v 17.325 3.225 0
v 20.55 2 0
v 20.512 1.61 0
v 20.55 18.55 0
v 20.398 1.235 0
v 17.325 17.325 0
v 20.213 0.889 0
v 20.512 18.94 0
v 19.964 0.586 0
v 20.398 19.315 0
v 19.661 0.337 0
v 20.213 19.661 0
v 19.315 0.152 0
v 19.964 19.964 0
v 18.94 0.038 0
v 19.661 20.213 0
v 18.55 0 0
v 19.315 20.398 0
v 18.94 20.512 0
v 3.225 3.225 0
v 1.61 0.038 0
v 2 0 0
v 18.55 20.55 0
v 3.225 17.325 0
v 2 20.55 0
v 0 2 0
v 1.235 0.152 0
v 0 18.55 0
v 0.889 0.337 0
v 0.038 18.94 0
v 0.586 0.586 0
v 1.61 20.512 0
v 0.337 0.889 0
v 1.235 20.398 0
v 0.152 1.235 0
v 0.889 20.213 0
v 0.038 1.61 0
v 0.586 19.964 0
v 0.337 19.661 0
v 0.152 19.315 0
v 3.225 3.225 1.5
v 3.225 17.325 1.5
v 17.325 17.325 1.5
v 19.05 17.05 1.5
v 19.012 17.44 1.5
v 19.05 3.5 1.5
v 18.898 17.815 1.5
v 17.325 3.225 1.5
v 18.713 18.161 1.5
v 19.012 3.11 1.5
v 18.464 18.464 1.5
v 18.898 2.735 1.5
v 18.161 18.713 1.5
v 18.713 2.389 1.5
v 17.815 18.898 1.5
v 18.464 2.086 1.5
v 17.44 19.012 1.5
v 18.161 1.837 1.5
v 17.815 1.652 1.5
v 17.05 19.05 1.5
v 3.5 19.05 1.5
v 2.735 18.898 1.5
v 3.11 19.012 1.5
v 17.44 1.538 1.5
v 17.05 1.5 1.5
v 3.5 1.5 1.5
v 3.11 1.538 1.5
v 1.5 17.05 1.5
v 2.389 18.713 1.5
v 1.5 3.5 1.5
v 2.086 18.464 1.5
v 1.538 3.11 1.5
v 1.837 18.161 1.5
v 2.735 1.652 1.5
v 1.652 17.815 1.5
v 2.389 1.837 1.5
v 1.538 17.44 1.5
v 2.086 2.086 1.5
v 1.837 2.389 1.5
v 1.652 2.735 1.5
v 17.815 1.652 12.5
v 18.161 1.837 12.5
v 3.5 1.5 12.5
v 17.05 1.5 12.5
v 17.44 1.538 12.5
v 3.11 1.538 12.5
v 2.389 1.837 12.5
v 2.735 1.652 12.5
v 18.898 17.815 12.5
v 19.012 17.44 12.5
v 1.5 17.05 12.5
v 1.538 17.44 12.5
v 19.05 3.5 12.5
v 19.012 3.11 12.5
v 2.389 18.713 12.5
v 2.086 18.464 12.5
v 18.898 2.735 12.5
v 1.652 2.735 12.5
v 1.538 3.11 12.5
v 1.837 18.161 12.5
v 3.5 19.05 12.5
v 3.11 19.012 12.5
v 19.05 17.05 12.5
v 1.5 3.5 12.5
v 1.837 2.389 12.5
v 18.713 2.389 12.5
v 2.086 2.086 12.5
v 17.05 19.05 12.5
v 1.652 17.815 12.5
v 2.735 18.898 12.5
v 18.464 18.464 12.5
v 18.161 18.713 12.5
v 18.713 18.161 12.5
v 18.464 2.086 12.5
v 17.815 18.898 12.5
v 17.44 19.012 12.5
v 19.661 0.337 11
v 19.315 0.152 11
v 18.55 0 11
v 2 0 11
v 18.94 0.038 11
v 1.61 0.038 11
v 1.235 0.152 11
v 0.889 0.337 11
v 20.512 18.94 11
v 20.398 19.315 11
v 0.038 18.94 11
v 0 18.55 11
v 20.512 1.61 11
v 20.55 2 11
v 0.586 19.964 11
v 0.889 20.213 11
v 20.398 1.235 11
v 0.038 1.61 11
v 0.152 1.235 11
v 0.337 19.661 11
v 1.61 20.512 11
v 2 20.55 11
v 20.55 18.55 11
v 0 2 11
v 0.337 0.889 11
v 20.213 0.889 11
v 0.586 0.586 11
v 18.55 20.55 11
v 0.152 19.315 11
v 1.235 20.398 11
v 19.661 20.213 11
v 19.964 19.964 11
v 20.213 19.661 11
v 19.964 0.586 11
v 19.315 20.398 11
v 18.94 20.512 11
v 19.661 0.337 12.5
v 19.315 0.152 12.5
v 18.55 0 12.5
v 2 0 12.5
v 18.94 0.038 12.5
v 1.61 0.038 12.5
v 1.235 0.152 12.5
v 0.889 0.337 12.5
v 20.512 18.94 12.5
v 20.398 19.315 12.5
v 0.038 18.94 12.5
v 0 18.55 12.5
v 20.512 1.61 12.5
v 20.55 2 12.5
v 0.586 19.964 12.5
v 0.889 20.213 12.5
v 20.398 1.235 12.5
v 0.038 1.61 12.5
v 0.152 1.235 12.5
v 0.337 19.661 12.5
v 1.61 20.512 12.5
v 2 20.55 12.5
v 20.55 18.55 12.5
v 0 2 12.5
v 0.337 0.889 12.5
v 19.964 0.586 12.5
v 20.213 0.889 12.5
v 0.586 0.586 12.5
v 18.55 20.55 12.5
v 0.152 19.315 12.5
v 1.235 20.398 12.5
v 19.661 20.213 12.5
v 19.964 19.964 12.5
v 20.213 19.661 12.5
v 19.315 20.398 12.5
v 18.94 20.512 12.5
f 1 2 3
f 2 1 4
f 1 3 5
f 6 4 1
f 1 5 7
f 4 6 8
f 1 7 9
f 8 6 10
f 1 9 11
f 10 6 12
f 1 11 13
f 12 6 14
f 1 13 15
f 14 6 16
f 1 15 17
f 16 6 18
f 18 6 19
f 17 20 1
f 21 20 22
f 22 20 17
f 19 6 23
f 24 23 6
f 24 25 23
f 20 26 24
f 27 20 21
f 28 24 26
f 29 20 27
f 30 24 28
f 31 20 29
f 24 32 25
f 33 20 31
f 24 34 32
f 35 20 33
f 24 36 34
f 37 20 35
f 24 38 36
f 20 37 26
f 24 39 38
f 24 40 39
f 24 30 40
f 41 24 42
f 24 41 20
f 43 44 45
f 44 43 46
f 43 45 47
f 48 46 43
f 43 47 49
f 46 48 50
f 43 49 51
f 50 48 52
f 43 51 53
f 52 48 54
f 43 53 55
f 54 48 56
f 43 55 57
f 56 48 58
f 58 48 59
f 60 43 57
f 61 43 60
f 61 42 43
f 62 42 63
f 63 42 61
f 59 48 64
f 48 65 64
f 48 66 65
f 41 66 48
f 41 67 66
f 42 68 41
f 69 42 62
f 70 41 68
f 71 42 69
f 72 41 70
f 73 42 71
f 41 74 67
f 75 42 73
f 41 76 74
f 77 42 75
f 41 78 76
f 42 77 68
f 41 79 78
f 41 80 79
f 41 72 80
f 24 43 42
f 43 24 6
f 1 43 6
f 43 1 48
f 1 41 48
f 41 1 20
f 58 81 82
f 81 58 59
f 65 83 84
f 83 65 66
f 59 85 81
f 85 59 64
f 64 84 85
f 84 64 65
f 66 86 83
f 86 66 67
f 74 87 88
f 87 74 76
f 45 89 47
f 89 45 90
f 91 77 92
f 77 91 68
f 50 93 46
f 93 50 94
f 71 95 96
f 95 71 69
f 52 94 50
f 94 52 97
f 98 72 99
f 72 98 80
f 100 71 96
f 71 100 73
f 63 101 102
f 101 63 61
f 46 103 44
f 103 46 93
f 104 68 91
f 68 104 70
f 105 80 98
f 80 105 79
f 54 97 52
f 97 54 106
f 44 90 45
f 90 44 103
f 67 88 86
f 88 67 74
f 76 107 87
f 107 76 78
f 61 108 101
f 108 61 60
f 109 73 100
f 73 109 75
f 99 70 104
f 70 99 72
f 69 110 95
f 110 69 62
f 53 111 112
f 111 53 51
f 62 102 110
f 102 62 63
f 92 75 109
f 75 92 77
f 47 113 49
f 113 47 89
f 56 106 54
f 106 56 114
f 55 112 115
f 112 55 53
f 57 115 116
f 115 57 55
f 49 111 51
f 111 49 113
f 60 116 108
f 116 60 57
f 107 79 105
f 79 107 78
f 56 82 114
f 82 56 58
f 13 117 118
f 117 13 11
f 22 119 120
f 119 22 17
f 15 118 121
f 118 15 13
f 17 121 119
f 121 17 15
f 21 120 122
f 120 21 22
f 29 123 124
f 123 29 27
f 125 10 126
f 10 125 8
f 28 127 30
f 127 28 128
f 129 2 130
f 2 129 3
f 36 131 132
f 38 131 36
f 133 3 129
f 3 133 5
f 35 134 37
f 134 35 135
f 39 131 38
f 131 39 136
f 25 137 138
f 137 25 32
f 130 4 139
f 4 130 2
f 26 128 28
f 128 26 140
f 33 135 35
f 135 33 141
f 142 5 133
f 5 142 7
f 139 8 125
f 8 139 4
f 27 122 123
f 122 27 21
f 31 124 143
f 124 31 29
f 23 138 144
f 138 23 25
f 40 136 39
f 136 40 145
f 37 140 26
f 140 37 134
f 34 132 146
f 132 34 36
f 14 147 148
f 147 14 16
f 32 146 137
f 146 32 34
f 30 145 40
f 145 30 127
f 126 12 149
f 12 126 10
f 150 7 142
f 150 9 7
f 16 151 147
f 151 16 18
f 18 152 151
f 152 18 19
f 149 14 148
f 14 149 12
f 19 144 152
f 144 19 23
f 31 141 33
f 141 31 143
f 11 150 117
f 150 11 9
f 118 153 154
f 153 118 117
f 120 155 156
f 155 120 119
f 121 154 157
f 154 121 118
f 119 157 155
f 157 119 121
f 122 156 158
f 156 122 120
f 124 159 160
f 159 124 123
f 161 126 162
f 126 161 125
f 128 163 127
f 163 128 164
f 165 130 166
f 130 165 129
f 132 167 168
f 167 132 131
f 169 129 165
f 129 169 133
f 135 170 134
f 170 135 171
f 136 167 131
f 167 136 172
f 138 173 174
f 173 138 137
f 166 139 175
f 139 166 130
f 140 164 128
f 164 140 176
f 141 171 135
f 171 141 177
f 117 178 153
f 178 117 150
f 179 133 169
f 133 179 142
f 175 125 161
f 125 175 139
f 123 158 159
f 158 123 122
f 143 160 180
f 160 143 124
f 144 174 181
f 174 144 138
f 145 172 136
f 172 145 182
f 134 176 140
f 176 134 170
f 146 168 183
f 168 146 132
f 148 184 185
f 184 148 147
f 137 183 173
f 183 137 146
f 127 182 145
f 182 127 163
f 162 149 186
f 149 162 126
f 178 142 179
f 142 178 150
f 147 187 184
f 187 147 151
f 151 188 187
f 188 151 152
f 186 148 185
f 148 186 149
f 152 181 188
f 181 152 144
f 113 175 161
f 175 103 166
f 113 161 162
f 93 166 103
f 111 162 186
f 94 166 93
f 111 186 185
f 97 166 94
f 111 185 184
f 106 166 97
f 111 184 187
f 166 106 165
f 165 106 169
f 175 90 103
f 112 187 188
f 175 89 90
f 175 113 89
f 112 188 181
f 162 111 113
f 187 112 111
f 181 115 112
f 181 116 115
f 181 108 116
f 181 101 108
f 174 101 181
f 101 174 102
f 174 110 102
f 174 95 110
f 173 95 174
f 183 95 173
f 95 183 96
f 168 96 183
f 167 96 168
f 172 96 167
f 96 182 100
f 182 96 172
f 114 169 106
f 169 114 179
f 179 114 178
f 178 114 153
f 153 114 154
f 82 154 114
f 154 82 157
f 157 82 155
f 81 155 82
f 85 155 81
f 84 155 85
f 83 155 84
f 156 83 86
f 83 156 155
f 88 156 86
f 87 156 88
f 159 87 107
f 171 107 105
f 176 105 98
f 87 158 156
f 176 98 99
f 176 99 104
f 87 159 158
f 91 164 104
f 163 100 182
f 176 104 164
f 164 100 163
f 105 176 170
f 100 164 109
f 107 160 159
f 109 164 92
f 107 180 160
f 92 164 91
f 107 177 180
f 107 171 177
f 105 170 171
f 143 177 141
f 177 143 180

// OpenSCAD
ROWS = 1;
COLUMNS = 1;
SWITCH_HEIGHT = 11;
SKIRT_HEIGHT = 1.5;
TOLERANCE = 0.1;
PLATE_THICKNESS = 1.5;      // Official spec for Cherry MX is 1.5 ± 0.1 mm
BOTTOM_PLATE_THICKNESS = 1; // Official spec for Cherry MX is 1.5 ± 0.1 mm
WALL_THICKNESS = 1.5;
CORNER_RADIUS = 2;

// See https://matt3o.com/anatomy-of-a-keyboard/
SWITCH_HOLE_SIZE = 14;
SWITCH_DISTANCE_BETWEEN_HOLES = 5.05;

$fn = 32;

module body_main(ROWS = ROWS, COLUMNS = COLUMNS, SWITCH_HEIGHT = SWITCH_HEIGHT, SKIRT_HEIGHT = SKIRT_HEIGHT,
                 TOLERANCE = TOLERANCE, PLATE_THICKNESS = PLATE_THICKNESS,
                 BOTTOM_PLATE_THICKNESS = BOTTOM_PLATE_THICKNESS, WALL_THICKNESS = WALL_THICKNESS,
                 CORNER_RADIUS = CORNER_RADIUS)
{
    keycap_placeholder_space = SWITCH_HOLE_SIZE + SWITCH_DISTANCE_BETWEEN_HOLES;
    x_size = keycap_placeholder_space * COLUMNS + WALL_THICKNESS;
    y_size = keycap_placeholder_space * ROWS + WALL_THICKNESS;
    x_size_corrected = x_size - CORNER_RADIUS * 2;
    y_size_corrected = y_size - CORNER_RADIUS * 2;
    x_inner_size_corrected = x_size_corrected - WALL_THICKNESS * 2;
    y_inner_size_corrected = y_size_corrected - WALL_THICKNESS * 2;

    module hole()
    {
        translate([ keycap_placeholder_space / 2, keycap_placeholder_space / 2, 0 ])
        {
            // Keycap Mock
            // translate([ 0, 0, 8 ]) color("red") linear_extrude(height = 8) square(keycap_placeholder_space, center =
            // true);

            // Plate hole
            color("blue") linear_extrude(height = PLATE_THICKNESS) square(SWITCH_HOLE_SIZE + TOLERANCE, center = true);

            // Structural hole
            translate([ 0, 0, PLATE_THICKNESS ]) linear_extrude(height = SWITCH_HEIGHT - PLATE_THICKNESS)
                offset(r = CORNER_RADIUS)
                    square(keycap_placeholder_space - CORNER_RADIUS * 2 - WALL_THICKNESS, center = true);
        }
    }

    module body()
    {
        difference()
        {
            // Body
            translate([ x_size / 2, y_size / 2, 0 ]) difference()
            {
                linear_extrude(height = SWITCH_HEIGHT) offset(r = CORNER_RADIUS)
                    square([ x_size_corrected, y_size_corrected ], center = true);

                // hull()
                // {
                //     translate([ 0, 0, SWITCH_HEIGHT / 4 ]) linear_extrude(height = 0.0001)
                //         offset(delta = -WALL_THICKNESS - keycap_placeholder_space / 3)
                //             square([ x_size, y_size ], center = true);
                //     translate([ 0, 0, SWITCH_HEIGHT ]) linear_extrude(height = 0.0001) offset(delta = -WALL_THICKNESS
                //     * 2)
                //         square([ x_size, y_size ], center = true);
                // }
            }

            // Holes
            translate([ WALL_THICKNESS / 2, WALL_THICKNESS / 2, 0 ])
            {
                for (column = [0:COLUMNS - 1])
                {
                    for (row = [0:ROWS - 1])
                    {
                        translate([ column * keycap_placeholder_space, row * keycap_placeholder_space, 0 ]) hole();
                    }
                }
            }
        }

        // Skirt
        translate([ x_size / 2, y_size / 2, SWITCH_HEIGHT ]) difference()
        {
            linear_extrude(height = SKIRT_HEIGHT) offset(r = CORNER_RADIUS)
                square([ x_size_corrected, y_size_corrected ], center = true);

            linear_extrude(height = SKIRT_HEIGHT) offset(r = CORNER_RADIUS)
                square([ x_inner_size_corrected, y_inner_size_corrected ], center = true);
        }
    }

    body();
}

body_main();
